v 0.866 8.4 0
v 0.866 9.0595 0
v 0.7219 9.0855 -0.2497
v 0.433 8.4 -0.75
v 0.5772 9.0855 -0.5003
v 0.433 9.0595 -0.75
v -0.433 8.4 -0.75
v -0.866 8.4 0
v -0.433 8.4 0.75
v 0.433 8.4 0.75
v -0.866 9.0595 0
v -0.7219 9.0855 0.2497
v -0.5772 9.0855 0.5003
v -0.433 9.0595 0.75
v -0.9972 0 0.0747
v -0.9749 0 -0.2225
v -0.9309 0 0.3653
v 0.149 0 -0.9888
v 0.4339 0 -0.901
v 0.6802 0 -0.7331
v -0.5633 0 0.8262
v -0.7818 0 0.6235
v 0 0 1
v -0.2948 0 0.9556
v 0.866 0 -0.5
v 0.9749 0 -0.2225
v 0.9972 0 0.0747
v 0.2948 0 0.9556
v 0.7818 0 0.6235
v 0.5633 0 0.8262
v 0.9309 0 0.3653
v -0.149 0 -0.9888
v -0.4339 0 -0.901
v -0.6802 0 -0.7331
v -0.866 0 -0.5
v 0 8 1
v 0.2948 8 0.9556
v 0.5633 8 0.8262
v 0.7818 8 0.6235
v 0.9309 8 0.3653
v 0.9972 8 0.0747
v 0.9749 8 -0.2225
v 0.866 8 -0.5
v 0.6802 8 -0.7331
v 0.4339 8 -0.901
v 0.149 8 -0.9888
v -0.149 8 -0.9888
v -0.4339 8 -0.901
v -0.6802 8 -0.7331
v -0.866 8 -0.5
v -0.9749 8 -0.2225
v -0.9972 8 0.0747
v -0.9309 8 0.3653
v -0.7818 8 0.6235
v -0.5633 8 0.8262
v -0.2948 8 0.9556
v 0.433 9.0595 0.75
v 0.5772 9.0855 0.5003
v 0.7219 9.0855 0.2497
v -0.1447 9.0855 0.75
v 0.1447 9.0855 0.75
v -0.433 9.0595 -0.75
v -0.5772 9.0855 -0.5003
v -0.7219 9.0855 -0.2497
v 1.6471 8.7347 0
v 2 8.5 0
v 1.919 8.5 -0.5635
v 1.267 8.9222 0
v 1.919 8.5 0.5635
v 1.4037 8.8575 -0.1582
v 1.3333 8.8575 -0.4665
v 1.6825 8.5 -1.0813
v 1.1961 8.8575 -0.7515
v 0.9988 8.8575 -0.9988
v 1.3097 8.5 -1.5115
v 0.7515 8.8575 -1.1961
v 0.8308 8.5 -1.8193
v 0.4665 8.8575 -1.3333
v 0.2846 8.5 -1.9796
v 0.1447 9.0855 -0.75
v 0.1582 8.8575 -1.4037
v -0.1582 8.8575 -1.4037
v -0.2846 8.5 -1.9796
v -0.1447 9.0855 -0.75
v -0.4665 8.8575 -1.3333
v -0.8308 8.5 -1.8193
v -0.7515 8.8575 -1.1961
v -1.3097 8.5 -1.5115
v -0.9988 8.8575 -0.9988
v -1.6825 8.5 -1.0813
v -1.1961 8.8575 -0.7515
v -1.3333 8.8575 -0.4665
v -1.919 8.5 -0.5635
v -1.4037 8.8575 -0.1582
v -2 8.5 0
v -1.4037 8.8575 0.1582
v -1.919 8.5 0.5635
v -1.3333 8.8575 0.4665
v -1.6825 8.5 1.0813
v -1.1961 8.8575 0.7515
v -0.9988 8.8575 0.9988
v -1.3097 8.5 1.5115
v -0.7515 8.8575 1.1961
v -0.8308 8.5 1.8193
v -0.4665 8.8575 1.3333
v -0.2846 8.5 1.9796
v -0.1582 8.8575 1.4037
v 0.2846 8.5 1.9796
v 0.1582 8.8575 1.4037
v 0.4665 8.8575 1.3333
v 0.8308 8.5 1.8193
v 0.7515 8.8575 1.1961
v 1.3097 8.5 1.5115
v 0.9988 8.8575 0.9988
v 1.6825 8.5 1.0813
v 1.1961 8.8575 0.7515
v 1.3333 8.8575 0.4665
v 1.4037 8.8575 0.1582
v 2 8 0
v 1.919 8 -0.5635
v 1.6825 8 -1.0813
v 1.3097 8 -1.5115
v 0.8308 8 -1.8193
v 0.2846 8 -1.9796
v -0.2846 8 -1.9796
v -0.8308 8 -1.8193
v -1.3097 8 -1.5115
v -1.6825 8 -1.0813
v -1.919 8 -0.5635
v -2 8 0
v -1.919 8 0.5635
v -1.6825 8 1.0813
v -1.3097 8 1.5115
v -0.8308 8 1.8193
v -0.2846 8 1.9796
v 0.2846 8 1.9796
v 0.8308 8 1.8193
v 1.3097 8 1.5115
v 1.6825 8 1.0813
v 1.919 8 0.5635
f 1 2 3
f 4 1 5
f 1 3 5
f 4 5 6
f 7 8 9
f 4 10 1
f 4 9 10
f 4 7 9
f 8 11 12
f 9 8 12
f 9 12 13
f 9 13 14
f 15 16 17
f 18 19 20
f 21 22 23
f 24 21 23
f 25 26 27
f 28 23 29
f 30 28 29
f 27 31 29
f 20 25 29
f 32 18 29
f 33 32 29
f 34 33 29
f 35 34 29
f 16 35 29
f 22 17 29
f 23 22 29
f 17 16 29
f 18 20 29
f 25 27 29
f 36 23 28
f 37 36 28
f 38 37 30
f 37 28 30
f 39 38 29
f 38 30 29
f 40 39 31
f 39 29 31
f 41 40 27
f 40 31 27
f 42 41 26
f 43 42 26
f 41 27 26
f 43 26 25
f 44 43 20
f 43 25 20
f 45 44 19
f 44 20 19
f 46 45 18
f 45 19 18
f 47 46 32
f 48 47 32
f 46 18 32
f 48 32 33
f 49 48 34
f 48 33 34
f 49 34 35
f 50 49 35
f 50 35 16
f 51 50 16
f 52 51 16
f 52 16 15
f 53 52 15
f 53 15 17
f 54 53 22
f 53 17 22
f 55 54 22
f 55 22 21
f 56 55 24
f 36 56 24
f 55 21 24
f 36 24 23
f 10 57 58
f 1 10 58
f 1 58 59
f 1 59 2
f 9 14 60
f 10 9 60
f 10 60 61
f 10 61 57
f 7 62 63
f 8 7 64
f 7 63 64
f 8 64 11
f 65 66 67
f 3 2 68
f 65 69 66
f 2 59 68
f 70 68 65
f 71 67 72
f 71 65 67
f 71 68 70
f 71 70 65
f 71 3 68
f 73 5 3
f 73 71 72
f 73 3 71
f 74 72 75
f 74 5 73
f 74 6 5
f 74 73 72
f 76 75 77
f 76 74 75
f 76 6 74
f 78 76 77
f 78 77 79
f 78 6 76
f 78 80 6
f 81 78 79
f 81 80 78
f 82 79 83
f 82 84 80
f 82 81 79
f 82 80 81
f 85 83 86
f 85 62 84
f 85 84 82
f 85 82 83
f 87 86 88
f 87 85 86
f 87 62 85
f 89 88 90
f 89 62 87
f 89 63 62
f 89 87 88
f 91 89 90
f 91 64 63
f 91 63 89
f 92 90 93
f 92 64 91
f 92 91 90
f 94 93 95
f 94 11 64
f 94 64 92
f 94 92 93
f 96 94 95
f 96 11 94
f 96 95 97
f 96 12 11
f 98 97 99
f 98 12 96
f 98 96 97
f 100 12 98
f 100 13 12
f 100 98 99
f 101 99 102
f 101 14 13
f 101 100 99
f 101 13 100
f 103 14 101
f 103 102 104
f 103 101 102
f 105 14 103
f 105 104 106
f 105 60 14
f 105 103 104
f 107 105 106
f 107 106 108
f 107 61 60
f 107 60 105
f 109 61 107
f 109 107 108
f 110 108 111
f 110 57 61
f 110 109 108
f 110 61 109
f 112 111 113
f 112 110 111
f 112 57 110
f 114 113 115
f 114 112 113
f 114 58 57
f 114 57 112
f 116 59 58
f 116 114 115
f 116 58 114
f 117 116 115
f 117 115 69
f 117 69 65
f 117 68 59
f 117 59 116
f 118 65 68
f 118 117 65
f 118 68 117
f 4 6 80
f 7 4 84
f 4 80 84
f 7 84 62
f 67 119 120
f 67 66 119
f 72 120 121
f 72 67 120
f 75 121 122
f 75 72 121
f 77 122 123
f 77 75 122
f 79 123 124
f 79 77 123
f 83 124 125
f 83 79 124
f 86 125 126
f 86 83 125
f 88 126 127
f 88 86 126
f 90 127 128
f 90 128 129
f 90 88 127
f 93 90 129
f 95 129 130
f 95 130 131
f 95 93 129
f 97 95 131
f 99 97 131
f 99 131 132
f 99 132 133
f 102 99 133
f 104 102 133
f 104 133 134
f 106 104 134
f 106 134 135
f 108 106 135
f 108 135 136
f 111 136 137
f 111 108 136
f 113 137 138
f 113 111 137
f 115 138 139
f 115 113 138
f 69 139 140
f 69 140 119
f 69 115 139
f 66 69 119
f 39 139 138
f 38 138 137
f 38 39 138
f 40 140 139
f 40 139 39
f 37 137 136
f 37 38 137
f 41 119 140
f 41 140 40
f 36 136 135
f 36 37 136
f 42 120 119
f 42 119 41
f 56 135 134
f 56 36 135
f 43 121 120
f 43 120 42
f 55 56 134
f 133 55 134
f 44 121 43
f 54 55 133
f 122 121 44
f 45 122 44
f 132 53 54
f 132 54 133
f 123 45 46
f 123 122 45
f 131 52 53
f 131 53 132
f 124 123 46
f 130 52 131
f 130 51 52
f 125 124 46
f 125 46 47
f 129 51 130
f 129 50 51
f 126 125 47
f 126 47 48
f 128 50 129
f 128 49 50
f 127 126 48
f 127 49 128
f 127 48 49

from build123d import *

# Parameters (mm, degrees)
SKETCH1_R           = 1
BOSS_EXTRUDE1_DEPTH = 8
CUT_EXTRUDE1_START  = 9.5
CUT_EXTRUDE1_DEPTH  = 1.1


with BuildPart() as part:
    # Sketch1 → Boss-Extrude1 (new body)
    with BuildSketch(Plane(origin=(0, 0, 0), x_dir=(1, 0, 0), z_dir=(0, 1, 0))):
        with Locations(Location((0, 0, 0), (0, 0, 270))):
            Circle(SKETCH1_R)
    extrude(amount=BOSS_EXTRUDE1_DEPTH)

    # Sketch2 → Revolve2 (revolve)
    with BuildSketch(Plane.XY, mode=Mode.PRIVATE) as revolve2_sk:
        with BuildLine():
            Line((0, 8), (-2, 8))
            Line((-2, 8), (-2, 8.5))
            ThreePointArc((-2, 8.5), (-1.055436608, 9.001787176), (0, 9.17511905))
            Line((0, 9.17511905), (0, 8))
        make_face()
    revolve(revolve2_sk.sketch.rotate(Axis((0, 8, 0), (0, 1, 0)), 180), axis=Axis((0, 8, 0), (0, 1, 0)))

    # Sketch3 → Cut-Extrude1 (cut)
    with BuildSketch(Plane(origin=(0, 0, 0), x_dir=(1, 0, 0), z_dir=(0, 1, 0)).offset(CUT_EXTRUDE1_START)):
        Polygon((0.433012702, -0.75), (0.866025404, 0), (0.433012702, 0.75), (-0.433012702, 0.75), (-0.866025404, 0), (-0.433012702, -0.75), align=None)
    extrude(amount=-CUT_EXTRUDE1_DEPTH, mode=Mode.SUBTRACT)


solid = part.part
